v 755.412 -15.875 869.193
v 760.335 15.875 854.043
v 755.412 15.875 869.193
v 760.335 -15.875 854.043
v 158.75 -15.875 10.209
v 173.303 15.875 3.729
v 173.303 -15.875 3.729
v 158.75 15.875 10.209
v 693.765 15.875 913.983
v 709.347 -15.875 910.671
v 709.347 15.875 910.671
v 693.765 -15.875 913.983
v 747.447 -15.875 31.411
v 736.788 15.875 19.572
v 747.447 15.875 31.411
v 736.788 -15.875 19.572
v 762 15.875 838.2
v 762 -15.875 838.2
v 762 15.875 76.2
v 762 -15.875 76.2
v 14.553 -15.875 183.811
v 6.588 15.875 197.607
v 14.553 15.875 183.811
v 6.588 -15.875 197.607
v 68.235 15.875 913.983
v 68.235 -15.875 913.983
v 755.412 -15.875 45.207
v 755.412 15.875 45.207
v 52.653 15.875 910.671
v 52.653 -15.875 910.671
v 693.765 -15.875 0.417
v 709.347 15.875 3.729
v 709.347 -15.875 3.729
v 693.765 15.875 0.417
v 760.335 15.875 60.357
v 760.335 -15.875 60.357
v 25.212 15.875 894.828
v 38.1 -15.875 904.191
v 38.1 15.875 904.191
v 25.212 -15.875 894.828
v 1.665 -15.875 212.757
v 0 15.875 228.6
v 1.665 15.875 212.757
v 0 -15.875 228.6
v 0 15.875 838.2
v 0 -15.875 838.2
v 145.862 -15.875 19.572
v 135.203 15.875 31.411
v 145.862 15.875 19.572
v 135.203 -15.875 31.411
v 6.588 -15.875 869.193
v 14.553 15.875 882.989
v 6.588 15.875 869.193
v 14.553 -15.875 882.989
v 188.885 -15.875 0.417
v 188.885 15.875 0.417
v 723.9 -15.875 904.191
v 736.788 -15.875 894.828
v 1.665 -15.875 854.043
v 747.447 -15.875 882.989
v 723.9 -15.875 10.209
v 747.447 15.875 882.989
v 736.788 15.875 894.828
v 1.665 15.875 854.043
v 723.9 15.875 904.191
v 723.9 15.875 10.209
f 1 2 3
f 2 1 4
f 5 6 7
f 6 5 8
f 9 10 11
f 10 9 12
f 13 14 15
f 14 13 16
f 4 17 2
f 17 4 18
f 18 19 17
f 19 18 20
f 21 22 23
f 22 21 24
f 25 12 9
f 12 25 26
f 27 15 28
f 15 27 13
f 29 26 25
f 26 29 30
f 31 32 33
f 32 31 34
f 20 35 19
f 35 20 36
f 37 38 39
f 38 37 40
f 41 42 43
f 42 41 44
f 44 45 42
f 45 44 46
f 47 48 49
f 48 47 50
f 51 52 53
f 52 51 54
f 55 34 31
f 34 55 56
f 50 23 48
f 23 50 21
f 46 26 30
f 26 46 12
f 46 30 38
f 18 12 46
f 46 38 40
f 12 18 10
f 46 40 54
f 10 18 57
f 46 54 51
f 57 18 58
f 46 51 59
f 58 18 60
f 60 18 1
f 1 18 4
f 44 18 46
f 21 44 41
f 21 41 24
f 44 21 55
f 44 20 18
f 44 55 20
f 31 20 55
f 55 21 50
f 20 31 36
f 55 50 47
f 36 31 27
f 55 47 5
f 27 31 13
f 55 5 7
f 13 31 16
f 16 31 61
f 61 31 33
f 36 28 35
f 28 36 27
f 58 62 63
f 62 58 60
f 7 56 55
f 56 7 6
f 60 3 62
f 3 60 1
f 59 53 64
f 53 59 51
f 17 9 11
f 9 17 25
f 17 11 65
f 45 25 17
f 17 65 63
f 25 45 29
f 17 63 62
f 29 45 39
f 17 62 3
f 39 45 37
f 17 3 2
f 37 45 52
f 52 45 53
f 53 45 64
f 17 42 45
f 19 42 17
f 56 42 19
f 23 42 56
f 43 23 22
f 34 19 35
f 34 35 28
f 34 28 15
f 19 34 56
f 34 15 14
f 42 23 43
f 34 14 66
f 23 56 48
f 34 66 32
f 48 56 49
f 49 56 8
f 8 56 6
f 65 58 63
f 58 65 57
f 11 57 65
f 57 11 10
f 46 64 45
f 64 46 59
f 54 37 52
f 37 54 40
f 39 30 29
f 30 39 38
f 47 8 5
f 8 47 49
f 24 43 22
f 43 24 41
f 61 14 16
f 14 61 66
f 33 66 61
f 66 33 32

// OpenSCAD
// file: ../lib/colors.scad
module color_wood() {
  color("#F8D89D")
    children();
}

module color_hdpe() {
  color("#ccd")
    children();
}

module color_steel() {
  color("#888")
    children();
}

module color_white() {
  color("#fafafa")
    children();
}

module color_black() {
  color("#333")
    children();
}

module color_outside() {
  color("#90b0c4")
    children();
}

module color_tinted_window() {
  color("#33333388")
    children();
}
// file: ../lib/convert.scad
function inches(in) = in * 25.4;
function feet(ft) = inches(ft * 12);
// main file
use <../lib/convert.scad>
use <../lib/colors.scad>

door_width = inches(30);
door_height = inches(36);
door_radius = inches(3);
door_thickness = inches(1.25);

window_width = inches(24);
window_height = inches(12);
window_radius = inches(2);

module door_window() {
  radius_offset = window_radius * 2;

  rotate([90, 0, 0])
  translate([window_radius, window_radius, -door_thickness / 2])
  color_tinted_window()
  hull() {
    // bottom left
    translate([0, 0, 0])
      cylinder(door_thickness, r1 = window_radius, r2 = window_radius);

    // bottom right
    translate([window_width - radius_offset, 0, 0])
      cylinder(door_thickness, r1 = window_radius, r2 = window_radius);

    // top left
    translate([0, window_height -  radius_offset, 0])
      cylinder(door_thickness, r1 = window_radius, r2 = window_radius);

    // top right
    translate([window_width -  radius_offset, window_height -  radius_offset, 0])
      cylinder(door_thickness, r1 = window_radius, r2 = window_radius);
  }
}

module door_frame() {
  radius_offset = door_radius * 2;

  rotate([90, 0, 0])
  translate([door_radius, door_radius, -door_thickness / 2])
  color_black()
  hull() {
    // bottom left, this creates a angled corner to fit the wheelwell
    translate([0, inches(6), 0])
      cylinder(door_thickness, r1 = door_radius, r2 = door_radius);
    translate([inches(4.75), 0, 0])
      cylinder(door_thickness, r1 = door_radius, r2 = door_radius);

    // bottom right
    translate([door_width - radius_offset, 0, 0])
      cylinder(door_thickness, r1 = door_radius, r2 = door_radius);

    // top left
    translate([0, door_height -  radius_offset, 0])
      cylinder(door_thickness, r1 = door_radius, r2 = door_radius);

    // top right
    translate([door_width -  radius_offset, door_height -  radius_offset, 0])
      cylinder(door_thickness, r1 = door_radius, r2 = door_radius);
  }
}

module door() {
  difference() {
    door_frame();

    translate([(door_width / 2) - (window_width / 2), 0, door_height - window_height - inches(3)])
    scale([1, 2, 1])
      door_window();
  }

  translate([(door_width / 2) - (window_width / 2), 0, door_height - window_height - inches(3)])
    door_window();
}

door();
